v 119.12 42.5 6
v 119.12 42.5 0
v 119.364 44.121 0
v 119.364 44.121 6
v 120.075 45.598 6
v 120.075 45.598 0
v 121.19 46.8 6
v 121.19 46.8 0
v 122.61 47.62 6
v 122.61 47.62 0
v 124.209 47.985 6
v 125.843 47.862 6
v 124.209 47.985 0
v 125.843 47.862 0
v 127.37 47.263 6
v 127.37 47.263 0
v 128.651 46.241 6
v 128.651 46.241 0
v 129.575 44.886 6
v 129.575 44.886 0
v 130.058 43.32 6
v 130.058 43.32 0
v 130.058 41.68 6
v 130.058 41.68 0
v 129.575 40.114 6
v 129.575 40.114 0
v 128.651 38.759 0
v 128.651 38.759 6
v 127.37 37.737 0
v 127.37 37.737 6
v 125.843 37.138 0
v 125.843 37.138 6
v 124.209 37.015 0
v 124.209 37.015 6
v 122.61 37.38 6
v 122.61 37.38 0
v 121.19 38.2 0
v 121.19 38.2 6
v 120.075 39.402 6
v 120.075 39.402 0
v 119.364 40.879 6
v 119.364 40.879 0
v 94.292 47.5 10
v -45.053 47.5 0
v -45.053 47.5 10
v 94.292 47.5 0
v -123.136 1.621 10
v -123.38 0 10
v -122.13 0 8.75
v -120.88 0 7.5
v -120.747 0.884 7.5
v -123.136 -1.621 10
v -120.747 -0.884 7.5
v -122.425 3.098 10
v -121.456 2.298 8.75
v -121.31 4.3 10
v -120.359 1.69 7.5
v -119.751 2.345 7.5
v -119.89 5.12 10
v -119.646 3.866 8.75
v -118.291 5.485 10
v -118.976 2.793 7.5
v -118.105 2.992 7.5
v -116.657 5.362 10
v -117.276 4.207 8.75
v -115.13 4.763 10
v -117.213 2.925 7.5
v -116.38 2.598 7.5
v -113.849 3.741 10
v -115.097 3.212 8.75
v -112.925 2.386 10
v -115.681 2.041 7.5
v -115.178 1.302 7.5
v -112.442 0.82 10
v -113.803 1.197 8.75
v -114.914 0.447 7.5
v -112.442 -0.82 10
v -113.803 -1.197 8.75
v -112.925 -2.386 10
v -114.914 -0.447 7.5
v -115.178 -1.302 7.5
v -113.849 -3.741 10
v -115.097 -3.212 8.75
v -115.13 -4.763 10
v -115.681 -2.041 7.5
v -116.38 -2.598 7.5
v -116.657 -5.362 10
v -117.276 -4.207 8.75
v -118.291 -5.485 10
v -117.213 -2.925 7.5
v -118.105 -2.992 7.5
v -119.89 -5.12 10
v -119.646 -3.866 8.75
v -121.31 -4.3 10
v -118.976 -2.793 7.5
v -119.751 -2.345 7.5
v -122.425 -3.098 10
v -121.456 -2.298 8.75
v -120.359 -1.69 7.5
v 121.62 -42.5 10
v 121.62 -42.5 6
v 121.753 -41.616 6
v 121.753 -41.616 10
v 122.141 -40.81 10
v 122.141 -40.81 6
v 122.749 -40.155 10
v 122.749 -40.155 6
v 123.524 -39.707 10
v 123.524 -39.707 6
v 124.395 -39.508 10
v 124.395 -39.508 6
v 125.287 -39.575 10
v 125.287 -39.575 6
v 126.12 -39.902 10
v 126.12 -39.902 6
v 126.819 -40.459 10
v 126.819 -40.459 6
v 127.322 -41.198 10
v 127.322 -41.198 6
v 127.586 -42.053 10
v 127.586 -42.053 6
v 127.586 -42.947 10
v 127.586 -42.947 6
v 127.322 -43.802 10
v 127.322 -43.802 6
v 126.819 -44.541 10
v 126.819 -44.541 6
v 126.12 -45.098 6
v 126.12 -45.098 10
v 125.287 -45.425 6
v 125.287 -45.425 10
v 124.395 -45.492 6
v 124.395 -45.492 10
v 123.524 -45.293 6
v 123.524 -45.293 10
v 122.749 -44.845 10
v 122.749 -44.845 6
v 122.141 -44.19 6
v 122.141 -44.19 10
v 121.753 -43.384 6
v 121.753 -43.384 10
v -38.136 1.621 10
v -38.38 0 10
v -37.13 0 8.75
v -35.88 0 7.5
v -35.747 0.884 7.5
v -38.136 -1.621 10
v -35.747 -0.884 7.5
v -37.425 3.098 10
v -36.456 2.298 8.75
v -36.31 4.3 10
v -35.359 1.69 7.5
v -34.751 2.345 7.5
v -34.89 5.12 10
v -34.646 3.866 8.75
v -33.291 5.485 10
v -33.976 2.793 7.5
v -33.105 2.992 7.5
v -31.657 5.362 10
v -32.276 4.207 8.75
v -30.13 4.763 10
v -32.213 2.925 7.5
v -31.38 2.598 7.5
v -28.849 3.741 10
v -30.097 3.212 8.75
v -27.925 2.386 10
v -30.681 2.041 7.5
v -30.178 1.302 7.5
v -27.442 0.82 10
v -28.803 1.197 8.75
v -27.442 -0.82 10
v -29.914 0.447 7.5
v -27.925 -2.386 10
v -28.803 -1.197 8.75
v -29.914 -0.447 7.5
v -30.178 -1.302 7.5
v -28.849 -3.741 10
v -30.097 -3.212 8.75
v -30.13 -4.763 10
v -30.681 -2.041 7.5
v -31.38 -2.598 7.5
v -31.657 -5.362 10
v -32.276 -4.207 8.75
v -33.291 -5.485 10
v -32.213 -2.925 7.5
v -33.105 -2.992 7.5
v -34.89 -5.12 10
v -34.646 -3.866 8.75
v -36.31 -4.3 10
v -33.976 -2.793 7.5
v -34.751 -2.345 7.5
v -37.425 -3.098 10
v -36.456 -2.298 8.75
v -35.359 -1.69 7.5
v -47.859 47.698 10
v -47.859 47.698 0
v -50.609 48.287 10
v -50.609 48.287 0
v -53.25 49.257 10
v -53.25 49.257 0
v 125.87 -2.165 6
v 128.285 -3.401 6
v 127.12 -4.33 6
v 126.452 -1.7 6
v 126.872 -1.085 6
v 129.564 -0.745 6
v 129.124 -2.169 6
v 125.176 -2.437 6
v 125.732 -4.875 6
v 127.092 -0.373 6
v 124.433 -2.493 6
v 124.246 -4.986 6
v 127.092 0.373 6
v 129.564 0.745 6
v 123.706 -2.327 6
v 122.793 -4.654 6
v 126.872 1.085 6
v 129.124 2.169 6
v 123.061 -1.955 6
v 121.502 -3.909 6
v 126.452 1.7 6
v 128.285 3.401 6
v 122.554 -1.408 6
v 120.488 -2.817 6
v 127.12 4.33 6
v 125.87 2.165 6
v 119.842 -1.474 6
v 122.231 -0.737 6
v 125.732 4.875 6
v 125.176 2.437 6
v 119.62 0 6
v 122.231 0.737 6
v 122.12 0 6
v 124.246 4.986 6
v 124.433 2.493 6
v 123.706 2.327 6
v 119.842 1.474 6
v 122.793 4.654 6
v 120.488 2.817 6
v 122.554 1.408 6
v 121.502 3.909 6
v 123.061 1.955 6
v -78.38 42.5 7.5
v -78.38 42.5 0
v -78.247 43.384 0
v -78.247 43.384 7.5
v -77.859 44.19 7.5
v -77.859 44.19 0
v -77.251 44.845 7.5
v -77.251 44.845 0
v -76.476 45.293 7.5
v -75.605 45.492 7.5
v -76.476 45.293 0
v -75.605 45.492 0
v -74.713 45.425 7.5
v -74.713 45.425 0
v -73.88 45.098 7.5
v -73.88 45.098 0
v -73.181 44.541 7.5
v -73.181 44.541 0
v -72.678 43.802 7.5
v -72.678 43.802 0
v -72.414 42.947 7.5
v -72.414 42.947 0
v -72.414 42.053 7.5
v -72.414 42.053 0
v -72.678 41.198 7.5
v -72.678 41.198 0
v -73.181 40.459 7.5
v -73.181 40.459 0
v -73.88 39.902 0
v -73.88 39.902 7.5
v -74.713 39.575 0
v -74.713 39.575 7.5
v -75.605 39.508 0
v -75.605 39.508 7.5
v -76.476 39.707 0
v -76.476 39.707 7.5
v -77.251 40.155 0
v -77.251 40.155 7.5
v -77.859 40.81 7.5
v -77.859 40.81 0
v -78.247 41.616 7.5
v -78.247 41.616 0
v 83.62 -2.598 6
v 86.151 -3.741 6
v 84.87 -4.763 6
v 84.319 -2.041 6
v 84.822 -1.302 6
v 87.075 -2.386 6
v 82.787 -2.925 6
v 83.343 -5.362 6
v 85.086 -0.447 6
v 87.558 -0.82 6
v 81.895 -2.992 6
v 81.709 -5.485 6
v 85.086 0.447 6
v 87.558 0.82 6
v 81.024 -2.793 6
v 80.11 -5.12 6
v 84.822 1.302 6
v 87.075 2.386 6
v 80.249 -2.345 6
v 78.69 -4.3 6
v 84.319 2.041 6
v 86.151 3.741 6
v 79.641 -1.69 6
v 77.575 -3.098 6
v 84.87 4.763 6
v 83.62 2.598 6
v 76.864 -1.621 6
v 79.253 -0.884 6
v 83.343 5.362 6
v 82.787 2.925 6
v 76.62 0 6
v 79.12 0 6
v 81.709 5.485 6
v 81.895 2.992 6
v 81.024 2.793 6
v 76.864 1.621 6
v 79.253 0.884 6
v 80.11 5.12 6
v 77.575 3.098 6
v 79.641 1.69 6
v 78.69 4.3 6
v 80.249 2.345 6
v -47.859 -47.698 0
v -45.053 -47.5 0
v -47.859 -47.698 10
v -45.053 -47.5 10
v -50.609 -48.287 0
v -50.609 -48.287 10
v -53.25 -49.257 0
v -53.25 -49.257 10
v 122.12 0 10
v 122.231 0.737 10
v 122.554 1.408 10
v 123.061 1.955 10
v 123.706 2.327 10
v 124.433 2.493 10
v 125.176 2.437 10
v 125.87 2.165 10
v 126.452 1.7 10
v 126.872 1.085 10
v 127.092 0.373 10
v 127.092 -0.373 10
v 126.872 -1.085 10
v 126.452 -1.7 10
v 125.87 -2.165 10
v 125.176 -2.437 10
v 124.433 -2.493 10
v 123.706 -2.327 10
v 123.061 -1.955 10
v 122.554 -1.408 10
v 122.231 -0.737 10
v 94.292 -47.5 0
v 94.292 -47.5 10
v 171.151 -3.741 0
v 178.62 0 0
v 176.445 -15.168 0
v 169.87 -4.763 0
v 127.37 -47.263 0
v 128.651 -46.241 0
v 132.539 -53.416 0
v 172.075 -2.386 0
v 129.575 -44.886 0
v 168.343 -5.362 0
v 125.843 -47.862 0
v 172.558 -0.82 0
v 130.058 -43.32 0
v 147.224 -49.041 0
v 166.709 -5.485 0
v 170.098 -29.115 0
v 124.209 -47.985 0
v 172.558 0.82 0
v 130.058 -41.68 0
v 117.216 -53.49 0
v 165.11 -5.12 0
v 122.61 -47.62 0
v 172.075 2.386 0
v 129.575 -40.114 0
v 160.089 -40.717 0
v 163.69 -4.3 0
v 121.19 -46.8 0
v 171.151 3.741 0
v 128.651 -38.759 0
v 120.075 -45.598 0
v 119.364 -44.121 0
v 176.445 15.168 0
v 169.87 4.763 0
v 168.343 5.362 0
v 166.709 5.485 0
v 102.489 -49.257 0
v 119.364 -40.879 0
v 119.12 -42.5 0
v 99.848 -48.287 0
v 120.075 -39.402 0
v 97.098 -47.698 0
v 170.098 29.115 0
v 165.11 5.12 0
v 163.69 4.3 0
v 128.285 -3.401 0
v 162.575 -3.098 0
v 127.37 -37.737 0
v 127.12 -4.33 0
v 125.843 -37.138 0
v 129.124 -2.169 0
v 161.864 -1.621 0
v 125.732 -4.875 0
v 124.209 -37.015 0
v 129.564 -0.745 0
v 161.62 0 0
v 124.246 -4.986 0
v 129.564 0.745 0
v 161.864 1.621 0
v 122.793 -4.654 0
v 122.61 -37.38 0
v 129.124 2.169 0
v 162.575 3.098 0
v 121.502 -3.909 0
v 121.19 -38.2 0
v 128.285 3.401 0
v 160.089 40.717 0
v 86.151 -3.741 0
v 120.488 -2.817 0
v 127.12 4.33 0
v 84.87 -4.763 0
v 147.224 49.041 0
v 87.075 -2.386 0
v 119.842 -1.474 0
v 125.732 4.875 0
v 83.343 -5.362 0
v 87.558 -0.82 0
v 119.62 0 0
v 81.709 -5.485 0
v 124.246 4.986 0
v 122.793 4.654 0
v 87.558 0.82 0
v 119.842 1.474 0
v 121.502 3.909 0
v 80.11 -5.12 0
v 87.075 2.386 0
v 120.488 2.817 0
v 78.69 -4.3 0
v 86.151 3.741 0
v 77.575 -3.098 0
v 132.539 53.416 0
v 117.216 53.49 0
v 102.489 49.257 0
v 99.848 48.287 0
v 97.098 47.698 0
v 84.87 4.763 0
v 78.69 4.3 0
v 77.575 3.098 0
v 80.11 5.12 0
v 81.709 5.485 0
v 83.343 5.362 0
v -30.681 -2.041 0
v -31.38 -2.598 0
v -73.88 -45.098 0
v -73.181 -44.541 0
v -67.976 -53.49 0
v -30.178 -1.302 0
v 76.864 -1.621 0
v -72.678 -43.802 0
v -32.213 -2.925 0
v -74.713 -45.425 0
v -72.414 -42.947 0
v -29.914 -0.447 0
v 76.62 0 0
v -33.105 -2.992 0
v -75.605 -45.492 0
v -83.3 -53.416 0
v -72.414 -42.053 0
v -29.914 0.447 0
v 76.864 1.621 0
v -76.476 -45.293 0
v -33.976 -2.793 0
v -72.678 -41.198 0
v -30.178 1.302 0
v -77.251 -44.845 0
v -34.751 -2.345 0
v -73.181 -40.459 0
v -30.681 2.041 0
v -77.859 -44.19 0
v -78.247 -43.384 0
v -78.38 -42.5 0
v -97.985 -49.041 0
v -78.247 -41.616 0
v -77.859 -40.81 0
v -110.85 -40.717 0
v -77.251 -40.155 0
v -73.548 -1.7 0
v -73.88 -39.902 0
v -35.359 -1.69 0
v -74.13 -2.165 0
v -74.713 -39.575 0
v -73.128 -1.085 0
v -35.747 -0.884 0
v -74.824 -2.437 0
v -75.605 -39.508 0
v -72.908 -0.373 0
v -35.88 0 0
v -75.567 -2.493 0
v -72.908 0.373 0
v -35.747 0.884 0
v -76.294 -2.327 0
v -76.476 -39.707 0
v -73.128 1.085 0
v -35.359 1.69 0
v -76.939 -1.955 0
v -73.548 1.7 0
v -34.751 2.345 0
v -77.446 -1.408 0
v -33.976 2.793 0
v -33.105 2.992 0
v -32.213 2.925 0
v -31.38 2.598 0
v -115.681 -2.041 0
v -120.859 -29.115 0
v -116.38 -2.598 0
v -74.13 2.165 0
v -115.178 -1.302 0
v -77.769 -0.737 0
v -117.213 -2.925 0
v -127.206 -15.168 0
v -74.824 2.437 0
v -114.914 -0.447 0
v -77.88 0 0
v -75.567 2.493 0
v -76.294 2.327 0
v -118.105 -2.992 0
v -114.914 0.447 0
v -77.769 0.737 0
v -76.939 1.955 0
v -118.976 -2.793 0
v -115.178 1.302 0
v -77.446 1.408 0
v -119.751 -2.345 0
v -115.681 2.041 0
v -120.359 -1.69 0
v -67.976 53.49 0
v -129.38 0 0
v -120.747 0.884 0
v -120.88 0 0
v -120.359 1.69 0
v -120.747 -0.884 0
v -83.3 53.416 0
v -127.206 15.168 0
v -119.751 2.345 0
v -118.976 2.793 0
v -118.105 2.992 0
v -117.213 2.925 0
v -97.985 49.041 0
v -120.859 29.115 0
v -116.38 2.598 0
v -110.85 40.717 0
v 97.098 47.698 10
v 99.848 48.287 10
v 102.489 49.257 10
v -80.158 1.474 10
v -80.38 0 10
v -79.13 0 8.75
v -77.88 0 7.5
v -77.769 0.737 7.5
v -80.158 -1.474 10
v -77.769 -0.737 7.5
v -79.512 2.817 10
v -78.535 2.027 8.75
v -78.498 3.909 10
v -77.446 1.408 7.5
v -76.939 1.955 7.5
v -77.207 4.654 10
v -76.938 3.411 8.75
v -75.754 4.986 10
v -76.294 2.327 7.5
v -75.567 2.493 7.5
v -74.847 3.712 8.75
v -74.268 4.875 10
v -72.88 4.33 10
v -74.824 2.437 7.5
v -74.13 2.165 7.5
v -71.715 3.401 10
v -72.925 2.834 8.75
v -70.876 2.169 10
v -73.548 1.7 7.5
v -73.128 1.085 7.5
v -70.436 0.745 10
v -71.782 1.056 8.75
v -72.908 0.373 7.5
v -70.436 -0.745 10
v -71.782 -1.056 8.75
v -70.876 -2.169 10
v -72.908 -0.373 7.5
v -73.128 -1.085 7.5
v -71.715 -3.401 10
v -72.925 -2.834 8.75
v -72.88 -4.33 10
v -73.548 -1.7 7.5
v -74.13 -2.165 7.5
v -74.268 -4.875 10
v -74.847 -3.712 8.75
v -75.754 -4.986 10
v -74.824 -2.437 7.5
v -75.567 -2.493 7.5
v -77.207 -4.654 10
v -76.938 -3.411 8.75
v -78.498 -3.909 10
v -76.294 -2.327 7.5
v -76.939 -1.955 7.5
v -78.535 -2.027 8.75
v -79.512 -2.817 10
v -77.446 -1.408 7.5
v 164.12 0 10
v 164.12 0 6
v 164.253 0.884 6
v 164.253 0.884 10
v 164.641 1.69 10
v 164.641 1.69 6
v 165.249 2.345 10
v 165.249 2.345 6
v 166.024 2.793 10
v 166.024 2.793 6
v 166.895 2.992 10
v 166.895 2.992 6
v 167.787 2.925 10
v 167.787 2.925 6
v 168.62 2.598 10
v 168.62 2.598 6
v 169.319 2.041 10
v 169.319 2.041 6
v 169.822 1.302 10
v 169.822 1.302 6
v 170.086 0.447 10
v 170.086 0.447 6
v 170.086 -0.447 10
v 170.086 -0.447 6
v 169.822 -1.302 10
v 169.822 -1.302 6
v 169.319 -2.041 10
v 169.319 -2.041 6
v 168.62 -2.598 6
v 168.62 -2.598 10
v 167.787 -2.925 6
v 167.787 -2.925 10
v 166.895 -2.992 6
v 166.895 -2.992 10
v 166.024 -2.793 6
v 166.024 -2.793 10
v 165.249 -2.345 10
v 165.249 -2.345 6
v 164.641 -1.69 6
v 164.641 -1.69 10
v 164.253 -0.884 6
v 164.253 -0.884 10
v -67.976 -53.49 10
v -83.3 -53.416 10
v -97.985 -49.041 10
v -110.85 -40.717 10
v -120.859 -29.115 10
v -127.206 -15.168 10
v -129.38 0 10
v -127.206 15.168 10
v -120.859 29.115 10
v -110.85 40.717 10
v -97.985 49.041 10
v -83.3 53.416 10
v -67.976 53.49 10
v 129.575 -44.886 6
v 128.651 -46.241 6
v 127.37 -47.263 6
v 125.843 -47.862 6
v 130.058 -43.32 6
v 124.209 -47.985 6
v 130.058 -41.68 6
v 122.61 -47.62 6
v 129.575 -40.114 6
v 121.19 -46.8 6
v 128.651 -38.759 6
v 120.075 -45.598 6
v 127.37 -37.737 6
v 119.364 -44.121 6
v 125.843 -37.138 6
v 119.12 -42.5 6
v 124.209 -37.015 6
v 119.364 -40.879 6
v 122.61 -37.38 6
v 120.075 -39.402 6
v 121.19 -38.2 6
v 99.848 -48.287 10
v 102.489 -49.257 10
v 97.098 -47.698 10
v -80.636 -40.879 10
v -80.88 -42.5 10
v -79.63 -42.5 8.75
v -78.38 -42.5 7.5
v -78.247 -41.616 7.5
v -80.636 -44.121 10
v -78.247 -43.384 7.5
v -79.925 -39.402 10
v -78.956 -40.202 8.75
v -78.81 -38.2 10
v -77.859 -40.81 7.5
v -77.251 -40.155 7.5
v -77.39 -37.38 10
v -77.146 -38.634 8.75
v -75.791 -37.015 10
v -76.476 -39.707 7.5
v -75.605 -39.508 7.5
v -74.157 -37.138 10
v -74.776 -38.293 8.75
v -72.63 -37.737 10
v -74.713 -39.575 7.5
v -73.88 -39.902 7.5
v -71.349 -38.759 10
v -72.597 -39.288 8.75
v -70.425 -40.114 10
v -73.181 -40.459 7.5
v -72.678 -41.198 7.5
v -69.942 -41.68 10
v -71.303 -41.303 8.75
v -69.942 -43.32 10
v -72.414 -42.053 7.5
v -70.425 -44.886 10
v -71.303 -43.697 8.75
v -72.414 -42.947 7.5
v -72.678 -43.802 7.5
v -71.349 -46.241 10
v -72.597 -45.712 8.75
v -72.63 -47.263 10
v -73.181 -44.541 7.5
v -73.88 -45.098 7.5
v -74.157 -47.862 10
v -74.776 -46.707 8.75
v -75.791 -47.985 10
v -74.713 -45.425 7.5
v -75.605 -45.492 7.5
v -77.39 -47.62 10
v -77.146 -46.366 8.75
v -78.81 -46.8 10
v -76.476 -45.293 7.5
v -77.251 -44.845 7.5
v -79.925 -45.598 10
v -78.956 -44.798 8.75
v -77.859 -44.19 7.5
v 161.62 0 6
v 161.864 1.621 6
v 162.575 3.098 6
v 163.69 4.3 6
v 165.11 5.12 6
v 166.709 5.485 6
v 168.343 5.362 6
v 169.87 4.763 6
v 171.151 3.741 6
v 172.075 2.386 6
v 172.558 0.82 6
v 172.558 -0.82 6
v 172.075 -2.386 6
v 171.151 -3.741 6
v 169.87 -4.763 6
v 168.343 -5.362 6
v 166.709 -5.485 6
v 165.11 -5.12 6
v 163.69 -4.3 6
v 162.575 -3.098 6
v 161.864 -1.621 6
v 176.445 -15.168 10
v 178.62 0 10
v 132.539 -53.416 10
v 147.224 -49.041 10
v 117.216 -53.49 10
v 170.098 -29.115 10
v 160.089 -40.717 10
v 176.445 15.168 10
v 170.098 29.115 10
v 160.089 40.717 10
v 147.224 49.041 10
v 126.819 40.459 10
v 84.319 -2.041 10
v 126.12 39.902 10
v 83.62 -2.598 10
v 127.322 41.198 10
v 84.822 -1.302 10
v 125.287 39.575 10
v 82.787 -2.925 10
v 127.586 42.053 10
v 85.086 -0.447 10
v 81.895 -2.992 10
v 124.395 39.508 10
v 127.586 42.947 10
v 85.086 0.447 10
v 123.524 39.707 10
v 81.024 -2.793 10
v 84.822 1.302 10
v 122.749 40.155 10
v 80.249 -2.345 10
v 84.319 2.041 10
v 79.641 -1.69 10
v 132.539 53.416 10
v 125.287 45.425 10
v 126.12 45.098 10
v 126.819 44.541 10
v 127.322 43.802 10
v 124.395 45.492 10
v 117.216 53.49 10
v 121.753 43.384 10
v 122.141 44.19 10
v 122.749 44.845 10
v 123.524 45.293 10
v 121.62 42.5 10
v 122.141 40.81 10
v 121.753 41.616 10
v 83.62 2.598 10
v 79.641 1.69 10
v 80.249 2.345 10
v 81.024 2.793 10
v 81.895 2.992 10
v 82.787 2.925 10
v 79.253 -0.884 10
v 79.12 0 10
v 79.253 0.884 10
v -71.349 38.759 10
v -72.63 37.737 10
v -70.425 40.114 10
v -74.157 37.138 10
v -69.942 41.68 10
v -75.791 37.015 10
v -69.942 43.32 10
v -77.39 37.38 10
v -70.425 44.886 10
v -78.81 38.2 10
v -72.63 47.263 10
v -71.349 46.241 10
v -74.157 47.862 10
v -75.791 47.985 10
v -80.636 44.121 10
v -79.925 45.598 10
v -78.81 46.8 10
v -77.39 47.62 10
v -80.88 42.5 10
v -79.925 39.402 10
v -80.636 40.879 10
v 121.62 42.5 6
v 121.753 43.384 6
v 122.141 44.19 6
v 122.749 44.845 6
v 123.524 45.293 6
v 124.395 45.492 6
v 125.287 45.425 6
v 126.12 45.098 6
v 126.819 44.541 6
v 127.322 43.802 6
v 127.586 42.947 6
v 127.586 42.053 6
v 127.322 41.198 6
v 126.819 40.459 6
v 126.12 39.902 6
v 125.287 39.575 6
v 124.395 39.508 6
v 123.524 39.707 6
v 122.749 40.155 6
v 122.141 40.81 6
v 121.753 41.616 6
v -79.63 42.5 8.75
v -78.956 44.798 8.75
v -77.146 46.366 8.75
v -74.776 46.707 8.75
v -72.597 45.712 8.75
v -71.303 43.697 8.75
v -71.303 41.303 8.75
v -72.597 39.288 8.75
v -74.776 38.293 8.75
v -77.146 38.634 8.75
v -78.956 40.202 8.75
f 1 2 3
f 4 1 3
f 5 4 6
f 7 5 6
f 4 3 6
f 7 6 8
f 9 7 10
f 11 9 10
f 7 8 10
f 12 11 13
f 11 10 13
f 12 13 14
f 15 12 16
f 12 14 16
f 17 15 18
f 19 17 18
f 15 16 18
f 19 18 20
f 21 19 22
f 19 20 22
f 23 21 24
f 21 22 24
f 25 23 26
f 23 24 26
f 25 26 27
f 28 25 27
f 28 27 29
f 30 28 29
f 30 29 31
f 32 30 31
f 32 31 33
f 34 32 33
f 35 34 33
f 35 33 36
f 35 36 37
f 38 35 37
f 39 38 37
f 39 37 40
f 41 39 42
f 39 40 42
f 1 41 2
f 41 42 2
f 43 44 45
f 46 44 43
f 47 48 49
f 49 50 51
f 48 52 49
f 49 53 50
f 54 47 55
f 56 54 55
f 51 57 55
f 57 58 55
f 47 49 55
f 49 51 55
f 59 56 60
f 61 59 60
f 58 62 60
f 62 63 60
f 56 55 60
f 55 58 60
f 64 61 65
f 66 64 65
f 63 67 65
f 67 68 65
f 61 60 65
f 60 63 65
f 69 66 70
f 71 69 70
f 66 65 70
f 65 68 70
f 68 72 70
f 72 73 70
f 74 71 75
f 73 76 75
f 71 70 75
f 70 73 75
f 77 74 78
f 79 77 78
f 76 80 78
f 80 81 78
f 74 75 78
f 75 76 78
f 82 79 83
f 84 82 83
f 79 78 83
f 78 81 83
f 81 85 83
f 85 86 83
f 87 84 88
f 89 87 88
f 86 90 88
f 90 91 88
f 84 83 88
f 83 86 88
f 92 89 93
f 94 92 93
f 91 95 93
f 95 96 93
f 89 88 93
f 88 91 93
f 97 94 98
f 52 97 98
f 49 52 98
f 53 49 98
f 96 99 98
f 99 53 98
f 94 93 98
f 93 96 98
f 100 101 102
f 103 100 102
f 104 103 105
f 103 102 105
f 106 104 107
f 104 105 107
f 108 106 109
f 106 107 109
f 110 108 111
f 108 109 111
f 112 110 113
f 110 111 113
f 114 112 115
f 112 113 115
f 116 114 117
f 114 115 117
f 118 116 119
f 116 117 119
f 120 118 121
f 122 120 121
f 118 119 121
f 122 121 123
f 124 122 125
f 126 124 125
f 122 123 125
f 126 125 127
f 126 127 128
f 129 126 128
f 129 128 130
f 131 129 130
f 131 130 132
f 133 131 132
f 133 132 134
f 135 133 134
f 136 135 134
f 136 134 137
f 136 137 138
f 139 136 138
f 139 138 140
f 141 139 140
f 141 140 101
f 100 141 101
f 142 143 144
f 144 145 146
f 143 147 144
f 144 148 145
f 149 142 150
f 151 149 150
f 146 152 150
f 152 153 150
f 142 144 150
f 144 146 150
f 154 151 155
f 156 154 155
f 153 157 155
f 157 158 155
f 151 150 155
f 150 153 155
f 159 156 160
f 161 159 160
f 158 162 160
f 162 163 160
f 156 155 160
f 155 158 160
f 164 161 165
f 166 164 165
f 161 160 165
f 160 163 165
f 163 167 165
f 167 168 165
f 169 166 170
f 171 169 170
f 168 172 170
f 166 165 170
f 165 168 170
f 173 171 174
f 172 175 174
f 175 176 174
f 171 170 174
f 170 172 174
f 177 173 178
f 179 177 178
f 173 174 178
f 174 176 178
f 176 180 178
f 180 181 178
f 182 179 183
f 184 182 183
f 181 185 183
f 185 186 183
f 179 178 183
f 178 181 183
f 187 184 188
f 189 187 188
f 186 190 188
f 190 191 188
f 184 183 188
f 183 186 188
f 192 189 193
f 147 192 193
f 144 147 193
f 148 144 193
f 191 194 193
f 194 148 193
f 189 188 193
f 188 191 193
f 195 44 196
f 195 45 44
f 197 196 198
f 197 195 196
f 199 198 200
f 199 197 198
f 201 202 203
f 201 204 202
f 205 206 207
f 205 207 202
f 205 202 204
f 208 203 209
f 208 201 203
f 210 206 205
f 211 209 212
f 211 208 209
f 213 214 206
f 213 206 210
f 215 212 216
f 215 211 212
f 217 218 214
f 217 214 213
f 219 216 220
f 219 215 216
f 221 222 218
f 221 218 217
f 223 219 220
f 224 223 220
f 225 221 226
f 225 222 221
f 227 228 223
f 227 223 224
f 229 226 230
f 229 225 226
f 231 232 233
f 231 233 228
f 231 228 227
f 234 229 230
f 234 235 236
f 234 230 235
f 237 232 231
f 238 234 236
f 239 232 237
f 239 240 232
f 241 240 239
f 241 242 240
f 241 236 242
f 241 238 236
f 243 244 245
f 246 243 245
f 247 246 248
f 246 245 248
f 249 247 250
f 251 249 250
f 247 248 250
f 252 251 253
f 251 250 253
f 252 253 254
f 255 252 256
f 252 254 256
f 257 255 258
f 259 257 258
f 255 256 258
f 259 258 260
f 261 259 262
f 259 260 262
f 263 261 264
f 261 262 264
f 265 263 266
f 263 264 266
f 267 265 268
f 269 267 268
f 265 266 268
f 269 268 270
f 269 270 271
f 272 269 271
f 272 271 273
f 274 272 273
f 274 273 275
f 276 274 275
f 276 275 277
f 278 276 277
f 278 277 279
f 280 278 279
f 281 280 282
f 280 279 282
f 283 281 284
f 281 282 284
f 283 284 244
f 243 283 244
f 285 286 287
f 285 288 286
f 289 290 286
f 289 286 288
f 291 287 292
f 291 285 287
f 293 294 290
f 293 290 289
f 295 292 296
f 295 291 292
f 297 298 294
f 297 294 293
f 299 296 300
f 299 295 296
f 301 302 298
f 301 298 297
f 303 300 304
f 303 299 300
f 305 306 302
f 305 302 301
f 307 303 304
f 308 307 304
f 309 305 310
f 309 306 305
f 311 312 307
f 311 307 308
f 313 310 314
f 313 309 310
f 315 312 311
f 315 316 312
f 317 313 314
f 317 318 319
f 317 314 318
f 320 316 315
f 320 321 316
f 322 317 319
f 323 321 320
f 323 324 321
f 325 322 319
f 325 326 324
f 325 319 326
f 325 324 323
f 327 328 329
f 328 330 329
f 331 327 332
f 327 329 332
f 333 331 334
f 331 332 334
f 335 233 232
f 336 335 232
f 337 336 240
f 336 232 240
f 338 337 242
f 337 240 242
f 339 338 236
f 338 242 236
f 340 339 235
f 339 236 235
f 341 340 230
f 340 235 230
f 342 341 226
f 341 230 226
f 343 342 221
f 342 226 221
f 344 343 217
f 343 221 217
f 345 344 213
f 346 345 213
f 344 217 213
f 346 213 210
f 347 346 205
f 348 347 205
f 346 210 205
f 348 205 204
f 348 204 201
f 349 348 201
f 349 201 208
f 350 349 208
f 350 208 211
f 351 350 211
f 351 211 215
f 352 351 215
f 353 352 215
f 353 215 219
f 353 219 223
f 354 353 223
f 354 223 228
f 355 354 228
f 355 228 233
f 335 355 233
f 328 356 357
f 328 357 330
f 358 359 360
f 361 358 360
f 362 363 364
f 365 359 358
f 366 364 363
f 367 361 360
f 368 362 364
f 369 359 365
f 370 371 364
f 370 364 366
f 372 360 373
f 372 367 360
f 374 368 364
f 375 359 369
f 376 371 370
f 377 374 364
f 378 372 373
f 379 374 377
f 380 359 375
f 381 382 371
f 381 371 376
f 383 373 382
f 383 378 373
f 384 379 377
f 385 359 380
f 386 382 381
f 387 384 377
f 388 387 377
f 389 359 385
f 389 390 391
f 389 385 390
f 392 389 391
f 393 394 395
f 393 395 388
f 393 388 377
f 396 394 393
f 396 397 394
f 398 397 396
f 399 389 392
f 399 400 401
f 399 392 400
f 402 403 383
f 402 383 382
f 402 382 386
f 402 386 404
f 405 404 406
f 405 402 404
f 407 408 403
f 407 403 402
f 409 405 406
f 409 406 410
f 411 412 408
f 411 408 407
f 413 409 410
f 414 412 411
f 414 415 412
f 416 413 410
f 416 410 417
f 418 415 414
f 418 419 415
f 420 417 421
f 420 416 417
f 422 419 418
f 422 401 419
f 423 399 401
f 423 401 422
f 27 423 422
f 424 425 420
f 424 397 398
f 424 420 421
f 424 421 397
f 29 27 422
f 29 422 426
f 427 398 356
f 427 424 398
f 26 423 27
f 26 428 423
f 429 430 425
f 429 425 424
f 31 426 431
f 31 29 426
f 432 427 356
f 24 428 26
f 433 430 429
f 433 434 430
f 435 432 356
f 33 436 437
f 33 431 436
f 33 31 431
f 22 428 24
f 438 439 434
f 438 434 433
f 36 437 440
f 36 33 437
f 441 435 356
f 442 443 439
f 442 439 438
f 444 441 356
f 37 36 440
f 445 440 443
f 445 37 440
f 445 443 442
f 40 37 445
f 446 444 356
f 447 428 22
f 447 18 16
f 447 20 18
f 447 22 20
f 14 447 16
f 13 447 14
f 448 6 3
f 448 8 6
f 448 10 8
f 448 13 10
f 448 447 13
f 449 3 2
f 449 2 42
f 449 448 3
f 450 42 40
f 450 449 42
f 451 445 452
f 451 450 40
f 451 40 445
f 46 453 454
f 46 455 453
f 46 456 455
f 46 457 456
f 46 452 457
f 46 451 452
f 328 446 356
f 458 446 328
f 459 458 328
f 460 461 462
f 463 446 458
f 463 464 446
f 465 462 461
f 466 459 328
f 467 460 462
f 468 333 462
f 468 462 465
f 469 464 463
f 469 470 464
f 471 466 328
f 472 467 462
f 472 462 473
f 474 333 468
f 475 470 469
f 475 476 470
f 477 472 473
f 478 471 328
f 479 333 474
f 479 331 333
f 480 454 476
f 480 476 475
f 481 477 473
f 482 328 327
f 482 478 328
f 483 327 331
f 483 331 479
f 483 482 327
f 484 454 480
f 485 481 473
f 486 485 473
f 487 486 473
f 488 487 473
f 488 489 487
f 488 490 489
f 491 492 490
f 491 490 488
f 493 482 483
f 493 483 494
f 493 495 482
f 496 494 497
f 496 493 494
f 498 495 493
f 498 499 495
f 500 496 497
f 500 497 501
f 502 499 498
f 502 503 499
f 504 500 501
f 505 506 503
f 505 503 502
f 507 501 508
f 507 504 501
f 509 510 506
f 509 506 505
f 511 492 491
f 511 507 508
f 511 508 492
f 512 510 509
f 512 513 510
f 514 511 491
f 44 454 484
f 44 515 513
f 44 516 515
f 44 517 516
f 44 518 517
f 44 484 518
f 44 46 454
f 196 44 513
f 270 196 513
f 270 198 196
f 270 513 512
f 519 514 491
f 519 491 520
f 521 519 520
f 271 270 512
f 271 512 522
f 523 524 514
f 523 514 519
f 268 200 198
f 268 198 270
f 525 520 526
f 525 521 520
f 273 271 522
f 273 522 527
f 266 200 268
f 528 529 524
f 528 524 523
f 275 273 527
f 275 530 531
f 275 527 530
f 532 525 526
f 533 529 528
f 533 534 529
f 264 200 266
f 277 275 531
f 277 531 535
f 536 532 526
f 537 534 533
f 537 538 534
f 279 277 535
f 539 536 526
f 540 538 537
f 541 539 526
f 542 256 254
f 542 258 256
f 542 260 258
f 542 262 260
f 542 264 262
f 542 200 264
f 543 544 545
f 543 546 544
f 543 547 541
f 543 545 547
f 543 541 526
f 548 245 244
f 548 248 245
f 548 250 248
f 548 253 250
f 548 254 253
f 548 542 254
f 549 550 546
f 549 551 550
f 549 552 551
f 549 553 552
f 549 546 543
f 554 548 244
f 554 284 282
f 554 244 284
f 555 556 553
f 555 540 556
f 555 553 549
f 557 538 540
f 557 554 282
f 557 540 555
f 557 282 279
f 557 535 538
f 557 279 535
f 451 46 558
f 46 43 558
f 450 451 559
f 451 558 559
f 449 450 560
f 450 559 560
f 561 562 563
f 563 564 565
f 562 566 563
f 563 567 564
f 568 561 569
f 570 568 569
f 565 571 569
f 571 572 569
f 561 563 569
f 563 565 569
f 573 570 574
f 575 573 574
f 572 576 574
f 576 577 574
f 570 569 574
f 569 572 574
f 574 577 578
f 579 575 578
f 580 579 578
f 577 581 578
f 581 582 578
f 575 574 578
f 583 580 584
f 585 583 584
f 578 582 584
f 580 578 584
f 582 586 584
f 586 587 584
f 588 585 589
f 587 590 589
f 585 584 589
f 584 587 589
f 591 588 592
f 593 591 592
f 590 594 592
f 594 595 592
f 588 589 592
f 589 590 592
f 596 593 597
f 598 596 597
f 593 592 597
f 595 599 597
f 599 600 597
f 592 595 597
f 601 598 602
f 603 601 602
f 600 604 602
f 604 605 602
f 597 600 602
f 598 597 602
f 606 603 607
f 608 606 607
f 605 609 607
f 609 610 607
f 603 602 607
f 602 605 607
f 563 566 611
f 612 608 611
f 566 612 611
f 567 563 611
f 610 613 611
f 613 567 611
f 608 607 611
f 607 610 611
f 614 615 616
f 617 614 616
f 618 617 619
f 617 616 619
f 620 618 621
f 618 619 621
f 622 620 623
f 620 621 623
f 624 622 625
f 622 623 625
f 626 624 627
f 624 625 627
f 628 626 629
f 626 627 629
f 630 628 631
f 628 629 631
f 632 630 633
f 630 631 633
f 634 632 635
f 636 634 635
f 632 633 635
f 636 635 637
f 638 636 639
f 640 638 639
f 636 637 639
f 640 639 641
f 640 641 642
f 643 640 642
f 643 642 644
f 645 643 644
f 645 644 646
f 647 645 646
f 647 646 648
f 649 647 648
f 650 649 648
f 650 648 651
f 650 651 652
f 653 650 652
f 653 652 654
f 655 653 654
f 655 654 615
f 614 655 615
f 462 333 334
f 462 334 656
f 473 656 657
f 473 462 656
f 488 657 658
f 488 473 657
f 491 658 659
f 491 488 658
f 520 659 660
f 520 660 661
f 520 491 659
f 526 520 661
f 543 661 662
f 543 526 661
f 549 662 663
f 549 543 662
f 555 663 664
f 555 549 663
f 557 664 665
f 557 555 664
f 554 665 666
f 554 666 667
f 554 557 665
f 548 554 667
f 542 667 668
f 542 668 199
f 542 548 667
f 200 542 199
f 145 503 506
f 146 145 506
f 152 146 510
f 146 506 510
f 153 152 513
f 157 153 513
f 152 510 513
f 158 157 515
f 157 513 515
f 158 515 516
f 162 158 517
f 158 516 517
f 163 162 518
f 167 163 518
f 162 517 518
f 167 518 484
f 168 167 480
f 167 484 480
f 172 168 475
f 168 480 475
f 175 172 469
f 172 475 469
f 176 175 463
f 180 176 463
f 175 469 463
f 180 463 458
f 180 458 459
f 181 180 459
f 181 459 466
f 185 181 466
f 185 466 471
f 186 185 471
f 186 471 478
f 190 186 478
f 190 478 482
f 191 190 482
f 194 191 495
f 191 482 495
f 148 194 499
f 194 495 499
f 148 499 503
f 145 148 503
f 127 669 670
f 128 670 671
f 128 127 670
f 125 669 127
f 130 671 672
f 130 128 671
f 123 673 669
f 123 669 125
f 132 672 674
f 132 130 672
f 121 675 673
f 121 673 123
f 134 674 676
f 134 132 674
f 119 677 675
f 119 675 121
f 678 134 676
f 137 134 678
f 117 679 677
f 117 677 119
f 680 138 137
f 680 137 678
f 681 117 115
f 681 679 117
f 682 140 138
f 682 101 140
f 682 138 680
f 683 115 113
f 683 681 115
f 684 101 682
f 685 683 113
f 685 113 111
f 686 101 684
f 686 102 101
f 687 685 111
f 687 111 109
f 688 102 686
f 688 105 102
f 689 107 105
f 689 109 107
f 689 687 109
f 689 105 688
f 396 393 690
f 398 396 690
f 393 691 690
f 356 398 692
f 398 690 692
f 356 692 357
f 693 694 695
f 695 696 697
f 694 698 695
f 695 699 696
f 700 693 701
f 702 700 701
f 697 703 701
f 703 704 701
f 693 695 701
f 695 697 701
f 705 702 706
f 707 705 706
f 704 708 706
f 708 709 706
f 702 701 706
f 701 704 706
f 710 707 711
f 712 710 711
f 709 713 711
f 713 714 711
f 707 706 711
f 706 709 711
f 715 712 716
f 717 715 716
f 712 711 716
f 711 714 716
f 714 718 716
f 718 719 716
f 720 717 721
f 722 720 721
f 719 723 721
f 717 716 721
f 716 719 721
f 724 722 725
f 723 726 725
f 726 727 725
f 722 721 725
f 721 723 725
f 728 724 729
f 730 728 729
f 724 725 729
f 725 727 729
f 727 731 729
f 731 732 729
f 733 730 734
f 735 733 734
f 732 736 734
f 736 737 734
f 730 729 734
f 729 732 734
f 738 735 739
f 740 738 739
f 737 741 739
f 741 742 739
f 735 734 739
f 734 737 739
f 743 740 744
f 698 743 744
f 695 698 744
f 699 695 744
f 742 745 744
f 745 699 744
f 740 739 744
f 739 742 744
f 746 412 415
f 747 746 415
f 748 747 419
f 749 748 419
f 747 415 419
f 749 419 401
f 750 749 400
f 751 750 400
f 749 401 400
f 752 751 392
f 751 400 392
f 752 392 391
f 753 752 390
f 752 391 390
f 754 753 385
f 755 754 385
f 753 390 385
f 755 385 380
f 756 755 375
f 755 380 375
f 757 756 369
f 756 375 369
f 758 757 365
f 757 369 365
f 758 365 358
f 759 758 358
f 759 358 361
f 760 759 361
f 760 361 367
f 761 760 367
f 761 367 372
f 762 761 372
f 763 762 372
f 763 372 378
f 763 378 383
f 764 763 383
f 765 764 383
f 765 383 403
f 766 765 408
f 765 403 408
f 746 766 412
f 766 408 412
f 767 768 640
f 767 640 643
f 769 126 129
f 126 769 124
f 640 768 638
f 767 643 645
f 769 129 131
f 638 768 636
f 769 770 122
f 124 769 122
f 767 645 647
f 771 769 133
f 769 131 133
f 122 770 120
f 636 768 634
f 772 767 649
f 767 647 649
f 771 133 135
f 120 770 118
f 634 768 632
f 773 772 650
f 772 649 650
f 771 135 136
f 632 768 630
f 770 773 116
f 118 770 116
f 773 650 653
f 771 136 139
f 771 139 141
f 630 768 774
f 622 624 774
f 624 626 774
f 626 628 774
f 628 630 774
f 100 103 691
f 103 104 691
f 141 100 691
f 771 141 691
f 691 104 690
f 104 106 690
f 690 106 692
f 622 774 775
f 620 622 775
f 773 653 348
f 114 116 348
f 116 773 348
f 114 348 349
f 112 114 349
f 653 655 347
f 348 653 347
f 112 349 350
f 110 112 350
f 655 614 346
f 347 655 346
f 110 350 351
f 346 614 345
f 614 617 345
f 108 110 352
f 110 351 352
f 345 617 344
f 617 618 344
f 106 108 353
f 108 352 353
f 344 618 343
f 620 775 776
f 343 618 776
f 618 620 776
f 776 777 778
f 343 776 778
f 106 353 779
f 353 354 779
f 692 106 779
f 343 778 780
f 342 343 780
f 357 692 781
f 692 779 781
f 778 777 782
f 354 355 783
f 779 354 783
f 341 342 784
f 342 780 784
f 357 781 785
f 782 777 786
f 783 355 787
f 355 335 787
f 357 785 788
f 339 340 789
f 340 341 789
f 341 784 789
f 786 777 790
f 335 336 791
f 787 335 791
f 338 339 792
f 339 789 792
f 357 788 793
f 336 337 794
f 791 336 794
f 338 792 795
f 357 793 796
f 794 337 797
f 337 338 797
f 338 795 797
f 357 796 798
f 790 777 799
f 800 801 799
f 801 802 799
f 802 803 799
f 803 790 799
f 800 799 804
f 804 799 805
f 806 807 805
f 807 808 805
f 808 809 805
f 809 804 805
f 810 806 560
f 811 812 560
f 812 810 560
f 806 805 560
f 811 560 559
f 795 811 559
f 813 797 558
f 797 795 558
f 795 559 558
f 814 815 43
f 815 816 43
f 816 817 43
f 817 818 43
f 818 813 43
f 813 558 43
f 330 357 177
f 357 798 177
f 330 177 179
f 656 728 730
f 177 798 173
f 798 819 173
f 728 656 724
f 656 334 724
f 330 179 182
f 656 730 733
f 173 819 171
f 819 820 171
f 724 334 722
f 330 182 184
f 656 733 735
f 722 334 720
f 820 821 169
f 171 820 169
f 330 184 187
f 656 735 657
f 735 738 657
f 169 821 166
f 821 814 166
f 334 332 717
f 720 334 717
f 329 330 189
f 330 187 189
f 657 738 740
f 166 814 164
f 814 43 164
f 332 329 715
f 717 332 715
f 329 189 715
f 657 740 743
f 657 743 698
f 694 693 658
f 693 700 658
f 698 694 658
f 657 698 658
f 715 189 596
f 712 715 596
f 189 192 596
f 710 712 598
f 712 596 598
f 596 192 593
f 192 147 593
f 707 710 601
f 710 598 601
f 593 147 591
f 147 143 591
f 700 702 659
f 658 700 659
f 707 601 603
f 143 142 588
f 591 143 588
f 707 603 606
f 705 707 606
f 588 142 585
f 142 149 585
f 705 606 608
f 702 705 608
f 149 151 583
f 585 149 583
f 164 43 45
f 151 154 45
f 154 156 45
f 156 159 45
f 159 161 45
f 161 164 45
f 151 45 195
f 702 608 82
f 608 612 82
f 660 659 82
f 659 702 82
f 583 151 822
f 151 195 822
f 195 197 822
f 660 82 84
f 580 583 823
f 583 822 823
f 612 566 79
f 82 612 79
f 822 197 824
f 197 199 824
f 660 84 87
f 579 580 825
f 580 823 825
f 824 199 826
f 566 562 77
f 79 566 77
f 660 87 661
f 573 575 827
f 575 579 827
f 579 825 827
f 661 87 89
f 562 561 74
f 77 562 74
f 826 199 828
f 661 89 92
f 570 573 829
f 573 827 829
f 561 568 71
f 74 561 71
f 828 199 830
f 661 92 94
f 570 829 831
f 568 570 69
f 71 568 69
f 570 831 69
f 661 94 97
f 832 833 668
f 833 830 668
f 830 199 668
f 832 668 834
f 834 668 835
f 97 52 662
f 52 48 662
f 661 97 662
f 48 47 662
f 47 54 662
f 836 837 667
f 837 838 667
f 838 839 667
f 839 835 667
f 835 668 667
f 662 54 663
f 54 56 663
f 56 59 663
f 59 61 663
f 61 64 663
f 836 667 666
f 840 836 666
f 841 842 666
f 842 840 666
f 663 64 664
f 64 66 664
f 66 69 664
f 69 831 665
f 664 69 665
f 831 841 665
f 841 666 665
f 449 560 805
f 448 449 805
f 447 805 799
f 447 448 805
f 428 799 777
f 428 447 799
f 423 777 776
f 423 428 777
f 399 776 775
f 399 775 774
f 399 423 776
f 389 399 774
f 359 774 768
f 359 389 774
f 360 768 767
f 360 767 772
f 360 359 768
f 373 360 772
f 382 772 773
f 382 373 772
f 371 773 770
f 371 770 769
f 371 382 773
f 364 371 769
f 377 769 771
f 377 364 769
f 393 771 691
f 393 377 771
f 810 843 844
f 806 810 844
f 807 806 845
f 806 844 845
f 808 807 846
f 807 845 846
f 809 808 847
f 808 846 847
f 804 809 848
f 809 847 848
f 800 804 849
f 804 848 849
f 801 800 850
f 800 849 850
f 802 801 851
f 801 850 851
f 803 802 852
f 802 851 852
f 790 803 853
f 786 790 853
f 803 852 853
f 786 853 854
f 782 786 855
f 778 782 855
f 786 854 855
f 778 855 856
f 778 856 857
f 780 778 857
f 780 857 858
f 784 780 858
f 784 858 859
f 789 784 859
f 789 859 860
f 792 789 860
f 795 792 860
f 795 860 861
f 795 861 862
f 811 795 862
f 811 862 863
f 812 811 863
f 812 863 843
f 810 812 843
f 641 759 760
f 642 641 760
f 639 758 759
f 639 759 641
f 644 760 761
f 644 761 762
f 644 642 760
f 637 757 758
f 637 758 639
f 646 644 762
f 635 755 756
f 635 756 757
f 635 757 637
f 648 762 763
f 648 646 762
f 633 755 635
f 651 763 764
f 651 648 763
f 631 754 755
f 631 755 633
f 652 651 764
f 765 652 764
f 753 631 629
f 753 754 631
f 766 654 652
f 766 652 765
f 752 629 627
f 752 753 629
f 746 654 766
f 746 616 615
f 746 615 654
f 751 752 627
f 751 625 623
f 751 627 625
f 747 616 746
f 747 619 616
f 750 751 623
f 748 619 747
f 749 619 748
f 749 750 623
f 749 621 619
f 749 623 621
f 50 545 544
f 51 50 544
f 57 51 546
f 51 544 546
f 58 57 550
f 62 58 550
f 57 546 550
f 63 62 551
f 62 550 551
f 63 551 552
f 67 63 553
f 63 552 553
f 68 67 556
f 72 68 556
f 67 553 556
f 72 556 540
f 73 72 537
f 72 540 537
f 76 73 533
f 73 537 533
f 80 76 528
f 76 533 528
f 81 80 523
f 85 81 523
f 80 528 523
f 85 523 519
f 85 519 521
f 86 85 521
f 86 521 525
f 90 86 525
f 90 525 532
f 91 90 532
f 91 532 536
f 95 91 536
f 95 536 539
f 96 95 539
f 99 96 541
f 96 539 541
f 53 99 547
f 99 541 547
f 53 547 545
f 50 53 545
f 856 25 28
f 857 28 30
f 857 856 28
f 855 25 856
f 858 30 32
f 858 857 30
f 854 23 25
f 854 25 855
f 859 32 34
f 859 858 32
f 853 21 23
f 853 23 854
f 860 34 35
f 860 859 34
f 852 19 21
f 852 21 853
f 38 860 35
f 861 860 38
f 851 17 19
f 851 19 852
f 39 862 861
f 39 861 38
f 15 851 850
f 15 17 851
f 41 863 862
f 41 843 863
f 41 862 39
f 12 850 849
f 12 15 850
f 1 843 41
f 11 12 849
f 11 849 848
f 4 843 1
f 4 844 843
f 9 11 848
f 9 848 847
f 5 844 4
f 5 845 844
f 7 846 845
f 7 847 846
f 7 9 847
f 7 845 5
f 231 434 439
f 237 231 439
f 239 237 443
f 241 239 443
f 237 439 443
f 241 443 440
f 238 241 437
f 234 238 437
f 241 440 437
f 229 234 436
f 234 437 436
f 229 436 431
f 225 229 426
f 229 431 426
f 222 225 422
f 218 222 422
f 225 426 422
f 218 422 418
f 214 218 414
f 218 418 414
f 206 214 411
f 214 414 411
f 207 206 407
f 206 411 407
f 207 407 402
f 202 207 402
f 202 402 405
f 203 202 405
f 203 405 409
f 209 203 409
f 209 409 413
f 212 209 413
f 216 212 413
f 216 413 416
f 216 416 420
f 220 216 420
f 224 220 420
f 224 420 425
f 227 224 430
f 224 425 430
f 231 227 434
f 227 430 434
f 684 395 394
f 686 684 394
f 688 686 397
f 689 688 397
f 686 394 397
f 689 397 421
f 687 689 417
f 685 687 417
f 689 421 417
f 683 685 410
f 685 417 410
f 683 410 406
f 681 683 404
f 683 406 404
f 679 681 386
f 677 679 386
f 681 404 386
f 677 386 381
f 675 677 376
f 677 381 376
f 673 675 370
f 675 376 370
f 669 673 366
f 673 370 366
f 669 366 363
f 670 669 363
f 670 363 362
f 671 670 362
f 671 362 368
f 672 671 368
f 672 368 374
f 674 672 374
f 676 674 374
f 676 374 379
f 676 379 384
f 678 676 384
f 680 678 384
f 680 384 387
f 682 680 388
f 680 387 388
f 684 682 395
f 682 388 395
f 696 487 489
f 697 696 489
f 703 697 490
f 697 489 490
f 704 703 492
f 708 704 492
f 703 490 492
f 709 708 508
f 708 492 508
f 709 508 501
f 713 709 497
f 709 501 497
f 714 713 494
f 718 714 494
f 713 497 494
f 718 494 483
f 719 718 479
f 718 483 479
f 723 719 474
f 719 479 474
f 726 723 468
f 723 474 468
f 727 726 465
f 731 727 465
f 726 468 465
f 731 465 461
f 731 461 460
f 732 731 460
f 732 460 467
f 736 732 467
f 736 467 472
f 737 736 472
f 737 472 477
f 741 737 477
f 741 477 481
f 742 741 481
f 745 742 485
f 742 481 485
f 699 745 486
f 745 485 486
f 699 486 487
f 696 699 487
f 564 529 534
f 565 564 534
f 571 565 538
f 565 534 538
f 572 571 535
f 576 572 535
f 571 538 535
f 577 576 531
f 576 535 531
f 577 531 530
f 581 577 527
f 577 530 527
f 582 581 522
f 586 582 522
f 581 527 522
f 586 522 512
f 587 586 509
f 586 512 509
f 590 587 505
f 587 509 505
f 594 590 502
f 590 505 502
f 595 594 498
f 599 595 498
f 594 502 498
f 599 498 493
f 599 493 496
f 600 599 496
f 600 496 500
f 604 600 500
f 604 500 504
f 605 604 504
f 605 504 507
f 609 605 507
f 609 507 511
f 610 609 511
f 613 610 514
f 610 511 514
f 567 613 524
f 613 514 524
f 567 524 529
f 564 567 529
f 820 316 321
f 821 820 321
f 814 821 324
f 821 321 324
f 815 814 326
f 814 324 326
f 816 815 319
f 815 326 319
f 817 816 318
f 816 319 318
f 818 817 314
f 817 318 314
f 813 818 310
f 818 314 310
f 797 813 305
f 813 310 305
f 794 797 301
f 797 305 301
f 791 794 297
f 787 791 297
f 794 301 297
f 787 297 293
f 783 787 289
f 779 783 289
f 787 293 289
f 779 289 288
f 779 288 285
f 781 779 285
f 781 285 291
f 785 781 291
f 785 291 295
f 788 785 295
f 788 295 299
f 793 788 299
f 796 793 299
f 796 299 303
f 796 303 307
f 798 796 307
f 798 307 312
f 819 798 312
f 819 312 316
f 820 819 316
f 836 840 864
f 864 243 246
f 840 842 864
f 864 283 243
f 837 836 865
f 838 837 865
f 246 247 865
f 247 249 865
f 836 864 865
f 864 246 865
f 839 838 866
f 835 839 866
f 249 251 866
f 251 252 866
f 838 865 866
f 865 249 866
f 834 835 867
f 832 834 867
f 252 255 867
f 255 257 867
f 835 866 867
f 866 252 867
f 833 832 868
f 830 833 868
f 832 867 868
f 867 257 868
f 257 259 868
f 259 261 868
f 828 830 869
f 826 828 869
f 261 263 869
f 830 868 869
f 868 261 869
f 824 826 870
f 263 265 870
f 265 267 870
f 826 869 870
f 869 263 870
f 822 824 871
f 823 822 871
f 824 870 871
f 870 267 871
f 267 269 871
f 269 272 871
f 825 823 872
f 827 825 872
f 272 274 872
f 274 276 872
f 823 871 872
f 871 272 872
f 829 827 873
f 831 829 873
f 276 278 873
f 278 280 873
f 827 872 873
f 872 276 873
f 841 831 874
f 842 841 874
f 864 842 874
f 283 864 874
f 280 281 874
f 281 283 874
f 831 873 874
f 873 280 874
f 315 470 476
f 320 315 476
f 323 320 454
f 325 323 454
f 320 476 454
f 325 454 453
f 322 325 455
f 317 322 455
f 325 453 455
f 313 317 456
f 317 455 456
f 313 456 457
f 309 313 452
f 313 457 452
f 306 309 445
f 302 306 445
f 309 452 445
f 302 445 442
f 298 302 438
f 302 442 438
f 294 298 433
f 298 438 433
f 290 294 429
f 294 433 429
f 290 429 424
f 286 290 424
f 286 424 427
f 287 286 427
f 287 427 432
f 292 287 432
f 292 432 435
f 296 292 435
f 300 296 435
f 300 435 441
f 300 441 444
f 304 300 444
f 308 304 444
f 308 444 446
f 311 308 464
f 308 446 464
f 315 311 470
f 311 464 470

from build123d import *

# Parameters (mm, degrees)
EXTRUDE_1_DEPTH     = 10
FILLET_1_R          = 20
SKETCH_2_R          = 3
SKETCH_2_R_2        = 2.5
CUT_EXTRUDE_1_DEPTH = 10
SKETCH_3_R          = 5.5
SKETCH_3_R_2        = 5
CUT_EXTRUDE_2_DEPTH = 6
SKETCH_4_R          = 2.5
CUT_EXTRUDE_3_DEPTH = 10
SKETCH_5_R          = 3
CUT_EXTRUDE_4_DEPTH = 10
CHAMFER_1_SIZE      = 2.5


with BuildPart() as part:
    # Эскиз1 → Бобышка-Вытянуть1 (new body)
    with BuildSketch(Plane.XY):
        with BuildLine():
            Line((-49.694865317, 47.5), (98.933936526, 47.5))
            ThreePointArc((98.933936526, 47.5), (178.619535605, 0), (98.933936526, -47.5))
            Line((98.933936526, -47.5), (-49.694865317, -47.5))
            ThreePointArc((-49.694865317, -47.5), (-129.380464395, 0), (-49.694865317, 47.5))
        make_face()
    extrude(amount=EXTRUDE_1_DEPTH)

    # Скругление1
    fillet_1_edges = [part.edges().sort_by_distance(p)[0] for p in [
        (-49.694865317, 47.5, 5),
        (98.933936526, 47.5, 5),
        (98.933936526, -47.5, 5),
        (-49.694865317, -47.5, 5),
    ]]
    fillet(fillet_1_edges, radius=FILLET_1_R)

    # Эскиз2 → Вырез-Вытянуть1 (cut)
    with BuildSketch(Plane(origin=(0, 0, 0), x_dir=(-1, 0, 0), z_dir=(0, 0, -1))):
        with Locations((-124.619535605, 42.5)):
            Circle(SKETCH_2_R)
        with Locations((-124.619535605, -42.5)):
            Circle(SKETCH_2_R)
        with Locations((-82.119535605, 0)):
            Circle(SKETCH_2_R)
        with Locations((-167.119535605, 0)):
            Circle(SKETCH_2_R)
        with Locations((-124.619535605, 0)):
            Circle(SKETCH_2_R_2)
    extrude(amount=-CUT_EXTRUDE_1_DEPTH, mode=Mode.SUBTRACT)

    # Эскиз3 → Вырез-Вытянуть2 (cut)
    with BuildSketch(Plane(origin=(0, 0, 0), x_dir=(-1, 0, 0), z_dir=(0, 0, -1))):
        with Locations((-124.619535605, 42.5)):
            Circle(SKETCH_3_R)
        with Locations((-167.119535605, 0)):
            Circle(SKETCH_3_R)
        with Locations((-124.619535605, -42.5)):
            Circle(SKETCH_3_R)
        with Locations((-82.119535605, 0)):
            Circle(SKETCH_3_R)
        with Locations((-124.619535605, 0)):
            Circle(SKETCH_3_R_2)
    extrude(amount=-CUT_EXTRUDE_2_DEPTH, mode=Mode.SUBTRACT)

    # Эскиз4 → Вырез-Вытянуть3 (cut)
    with BuildSketch(Plane(origin=(0, 0, 0), x_dir=(-1, 0, 0), z_dir=(0, 0, -1))):
        with Locations((75.380464395, 0)):
            Circle(SKETCH_4_R)
    extrude(amount=-CUT_EXTRUDE_3_DEPTH, mode=Mode.SUBTRACT)

    # Эскиз5 → Вырез-Вытянуть4 (cut)
    with BuildSketch(Plane(origin=(0, 0, 0), x_dir=(-1, 0, 0), z_dir=(0, 0, -1))):
        with Locations((75.380464395, 42.5)):
            Circle(SKETCH_5_R)
        with Locations((75.380464395, -42.5)):
            Circle(SKETCH_5_R)
        with Locations((32.880464395, 0)):
            Circle(SKETCH_5_R)
        with Locations((117.880464395, 0)):
            Circle(SKETCH_5_R)
    extrude(amount=-CUT_EXTRUDE_4_DEPTH, mode=Mode.SUBTRACT)

    # Фаска1
    chamfer_1_edges = [part.edges().sort_by_distance(p)[0] for p in [
        (-72.380464395, -42.5, 10),
        (-29.880464395, 0, 10),
        (-114.880464395, 0, 10),
        (-72.880464395, 0, 10),
        (-72.380464395, 42.5, 10),
    ]]
    chamfer(chamfer_1_edges, length=CHAMFER_1_SIZE)


solid = part.part
